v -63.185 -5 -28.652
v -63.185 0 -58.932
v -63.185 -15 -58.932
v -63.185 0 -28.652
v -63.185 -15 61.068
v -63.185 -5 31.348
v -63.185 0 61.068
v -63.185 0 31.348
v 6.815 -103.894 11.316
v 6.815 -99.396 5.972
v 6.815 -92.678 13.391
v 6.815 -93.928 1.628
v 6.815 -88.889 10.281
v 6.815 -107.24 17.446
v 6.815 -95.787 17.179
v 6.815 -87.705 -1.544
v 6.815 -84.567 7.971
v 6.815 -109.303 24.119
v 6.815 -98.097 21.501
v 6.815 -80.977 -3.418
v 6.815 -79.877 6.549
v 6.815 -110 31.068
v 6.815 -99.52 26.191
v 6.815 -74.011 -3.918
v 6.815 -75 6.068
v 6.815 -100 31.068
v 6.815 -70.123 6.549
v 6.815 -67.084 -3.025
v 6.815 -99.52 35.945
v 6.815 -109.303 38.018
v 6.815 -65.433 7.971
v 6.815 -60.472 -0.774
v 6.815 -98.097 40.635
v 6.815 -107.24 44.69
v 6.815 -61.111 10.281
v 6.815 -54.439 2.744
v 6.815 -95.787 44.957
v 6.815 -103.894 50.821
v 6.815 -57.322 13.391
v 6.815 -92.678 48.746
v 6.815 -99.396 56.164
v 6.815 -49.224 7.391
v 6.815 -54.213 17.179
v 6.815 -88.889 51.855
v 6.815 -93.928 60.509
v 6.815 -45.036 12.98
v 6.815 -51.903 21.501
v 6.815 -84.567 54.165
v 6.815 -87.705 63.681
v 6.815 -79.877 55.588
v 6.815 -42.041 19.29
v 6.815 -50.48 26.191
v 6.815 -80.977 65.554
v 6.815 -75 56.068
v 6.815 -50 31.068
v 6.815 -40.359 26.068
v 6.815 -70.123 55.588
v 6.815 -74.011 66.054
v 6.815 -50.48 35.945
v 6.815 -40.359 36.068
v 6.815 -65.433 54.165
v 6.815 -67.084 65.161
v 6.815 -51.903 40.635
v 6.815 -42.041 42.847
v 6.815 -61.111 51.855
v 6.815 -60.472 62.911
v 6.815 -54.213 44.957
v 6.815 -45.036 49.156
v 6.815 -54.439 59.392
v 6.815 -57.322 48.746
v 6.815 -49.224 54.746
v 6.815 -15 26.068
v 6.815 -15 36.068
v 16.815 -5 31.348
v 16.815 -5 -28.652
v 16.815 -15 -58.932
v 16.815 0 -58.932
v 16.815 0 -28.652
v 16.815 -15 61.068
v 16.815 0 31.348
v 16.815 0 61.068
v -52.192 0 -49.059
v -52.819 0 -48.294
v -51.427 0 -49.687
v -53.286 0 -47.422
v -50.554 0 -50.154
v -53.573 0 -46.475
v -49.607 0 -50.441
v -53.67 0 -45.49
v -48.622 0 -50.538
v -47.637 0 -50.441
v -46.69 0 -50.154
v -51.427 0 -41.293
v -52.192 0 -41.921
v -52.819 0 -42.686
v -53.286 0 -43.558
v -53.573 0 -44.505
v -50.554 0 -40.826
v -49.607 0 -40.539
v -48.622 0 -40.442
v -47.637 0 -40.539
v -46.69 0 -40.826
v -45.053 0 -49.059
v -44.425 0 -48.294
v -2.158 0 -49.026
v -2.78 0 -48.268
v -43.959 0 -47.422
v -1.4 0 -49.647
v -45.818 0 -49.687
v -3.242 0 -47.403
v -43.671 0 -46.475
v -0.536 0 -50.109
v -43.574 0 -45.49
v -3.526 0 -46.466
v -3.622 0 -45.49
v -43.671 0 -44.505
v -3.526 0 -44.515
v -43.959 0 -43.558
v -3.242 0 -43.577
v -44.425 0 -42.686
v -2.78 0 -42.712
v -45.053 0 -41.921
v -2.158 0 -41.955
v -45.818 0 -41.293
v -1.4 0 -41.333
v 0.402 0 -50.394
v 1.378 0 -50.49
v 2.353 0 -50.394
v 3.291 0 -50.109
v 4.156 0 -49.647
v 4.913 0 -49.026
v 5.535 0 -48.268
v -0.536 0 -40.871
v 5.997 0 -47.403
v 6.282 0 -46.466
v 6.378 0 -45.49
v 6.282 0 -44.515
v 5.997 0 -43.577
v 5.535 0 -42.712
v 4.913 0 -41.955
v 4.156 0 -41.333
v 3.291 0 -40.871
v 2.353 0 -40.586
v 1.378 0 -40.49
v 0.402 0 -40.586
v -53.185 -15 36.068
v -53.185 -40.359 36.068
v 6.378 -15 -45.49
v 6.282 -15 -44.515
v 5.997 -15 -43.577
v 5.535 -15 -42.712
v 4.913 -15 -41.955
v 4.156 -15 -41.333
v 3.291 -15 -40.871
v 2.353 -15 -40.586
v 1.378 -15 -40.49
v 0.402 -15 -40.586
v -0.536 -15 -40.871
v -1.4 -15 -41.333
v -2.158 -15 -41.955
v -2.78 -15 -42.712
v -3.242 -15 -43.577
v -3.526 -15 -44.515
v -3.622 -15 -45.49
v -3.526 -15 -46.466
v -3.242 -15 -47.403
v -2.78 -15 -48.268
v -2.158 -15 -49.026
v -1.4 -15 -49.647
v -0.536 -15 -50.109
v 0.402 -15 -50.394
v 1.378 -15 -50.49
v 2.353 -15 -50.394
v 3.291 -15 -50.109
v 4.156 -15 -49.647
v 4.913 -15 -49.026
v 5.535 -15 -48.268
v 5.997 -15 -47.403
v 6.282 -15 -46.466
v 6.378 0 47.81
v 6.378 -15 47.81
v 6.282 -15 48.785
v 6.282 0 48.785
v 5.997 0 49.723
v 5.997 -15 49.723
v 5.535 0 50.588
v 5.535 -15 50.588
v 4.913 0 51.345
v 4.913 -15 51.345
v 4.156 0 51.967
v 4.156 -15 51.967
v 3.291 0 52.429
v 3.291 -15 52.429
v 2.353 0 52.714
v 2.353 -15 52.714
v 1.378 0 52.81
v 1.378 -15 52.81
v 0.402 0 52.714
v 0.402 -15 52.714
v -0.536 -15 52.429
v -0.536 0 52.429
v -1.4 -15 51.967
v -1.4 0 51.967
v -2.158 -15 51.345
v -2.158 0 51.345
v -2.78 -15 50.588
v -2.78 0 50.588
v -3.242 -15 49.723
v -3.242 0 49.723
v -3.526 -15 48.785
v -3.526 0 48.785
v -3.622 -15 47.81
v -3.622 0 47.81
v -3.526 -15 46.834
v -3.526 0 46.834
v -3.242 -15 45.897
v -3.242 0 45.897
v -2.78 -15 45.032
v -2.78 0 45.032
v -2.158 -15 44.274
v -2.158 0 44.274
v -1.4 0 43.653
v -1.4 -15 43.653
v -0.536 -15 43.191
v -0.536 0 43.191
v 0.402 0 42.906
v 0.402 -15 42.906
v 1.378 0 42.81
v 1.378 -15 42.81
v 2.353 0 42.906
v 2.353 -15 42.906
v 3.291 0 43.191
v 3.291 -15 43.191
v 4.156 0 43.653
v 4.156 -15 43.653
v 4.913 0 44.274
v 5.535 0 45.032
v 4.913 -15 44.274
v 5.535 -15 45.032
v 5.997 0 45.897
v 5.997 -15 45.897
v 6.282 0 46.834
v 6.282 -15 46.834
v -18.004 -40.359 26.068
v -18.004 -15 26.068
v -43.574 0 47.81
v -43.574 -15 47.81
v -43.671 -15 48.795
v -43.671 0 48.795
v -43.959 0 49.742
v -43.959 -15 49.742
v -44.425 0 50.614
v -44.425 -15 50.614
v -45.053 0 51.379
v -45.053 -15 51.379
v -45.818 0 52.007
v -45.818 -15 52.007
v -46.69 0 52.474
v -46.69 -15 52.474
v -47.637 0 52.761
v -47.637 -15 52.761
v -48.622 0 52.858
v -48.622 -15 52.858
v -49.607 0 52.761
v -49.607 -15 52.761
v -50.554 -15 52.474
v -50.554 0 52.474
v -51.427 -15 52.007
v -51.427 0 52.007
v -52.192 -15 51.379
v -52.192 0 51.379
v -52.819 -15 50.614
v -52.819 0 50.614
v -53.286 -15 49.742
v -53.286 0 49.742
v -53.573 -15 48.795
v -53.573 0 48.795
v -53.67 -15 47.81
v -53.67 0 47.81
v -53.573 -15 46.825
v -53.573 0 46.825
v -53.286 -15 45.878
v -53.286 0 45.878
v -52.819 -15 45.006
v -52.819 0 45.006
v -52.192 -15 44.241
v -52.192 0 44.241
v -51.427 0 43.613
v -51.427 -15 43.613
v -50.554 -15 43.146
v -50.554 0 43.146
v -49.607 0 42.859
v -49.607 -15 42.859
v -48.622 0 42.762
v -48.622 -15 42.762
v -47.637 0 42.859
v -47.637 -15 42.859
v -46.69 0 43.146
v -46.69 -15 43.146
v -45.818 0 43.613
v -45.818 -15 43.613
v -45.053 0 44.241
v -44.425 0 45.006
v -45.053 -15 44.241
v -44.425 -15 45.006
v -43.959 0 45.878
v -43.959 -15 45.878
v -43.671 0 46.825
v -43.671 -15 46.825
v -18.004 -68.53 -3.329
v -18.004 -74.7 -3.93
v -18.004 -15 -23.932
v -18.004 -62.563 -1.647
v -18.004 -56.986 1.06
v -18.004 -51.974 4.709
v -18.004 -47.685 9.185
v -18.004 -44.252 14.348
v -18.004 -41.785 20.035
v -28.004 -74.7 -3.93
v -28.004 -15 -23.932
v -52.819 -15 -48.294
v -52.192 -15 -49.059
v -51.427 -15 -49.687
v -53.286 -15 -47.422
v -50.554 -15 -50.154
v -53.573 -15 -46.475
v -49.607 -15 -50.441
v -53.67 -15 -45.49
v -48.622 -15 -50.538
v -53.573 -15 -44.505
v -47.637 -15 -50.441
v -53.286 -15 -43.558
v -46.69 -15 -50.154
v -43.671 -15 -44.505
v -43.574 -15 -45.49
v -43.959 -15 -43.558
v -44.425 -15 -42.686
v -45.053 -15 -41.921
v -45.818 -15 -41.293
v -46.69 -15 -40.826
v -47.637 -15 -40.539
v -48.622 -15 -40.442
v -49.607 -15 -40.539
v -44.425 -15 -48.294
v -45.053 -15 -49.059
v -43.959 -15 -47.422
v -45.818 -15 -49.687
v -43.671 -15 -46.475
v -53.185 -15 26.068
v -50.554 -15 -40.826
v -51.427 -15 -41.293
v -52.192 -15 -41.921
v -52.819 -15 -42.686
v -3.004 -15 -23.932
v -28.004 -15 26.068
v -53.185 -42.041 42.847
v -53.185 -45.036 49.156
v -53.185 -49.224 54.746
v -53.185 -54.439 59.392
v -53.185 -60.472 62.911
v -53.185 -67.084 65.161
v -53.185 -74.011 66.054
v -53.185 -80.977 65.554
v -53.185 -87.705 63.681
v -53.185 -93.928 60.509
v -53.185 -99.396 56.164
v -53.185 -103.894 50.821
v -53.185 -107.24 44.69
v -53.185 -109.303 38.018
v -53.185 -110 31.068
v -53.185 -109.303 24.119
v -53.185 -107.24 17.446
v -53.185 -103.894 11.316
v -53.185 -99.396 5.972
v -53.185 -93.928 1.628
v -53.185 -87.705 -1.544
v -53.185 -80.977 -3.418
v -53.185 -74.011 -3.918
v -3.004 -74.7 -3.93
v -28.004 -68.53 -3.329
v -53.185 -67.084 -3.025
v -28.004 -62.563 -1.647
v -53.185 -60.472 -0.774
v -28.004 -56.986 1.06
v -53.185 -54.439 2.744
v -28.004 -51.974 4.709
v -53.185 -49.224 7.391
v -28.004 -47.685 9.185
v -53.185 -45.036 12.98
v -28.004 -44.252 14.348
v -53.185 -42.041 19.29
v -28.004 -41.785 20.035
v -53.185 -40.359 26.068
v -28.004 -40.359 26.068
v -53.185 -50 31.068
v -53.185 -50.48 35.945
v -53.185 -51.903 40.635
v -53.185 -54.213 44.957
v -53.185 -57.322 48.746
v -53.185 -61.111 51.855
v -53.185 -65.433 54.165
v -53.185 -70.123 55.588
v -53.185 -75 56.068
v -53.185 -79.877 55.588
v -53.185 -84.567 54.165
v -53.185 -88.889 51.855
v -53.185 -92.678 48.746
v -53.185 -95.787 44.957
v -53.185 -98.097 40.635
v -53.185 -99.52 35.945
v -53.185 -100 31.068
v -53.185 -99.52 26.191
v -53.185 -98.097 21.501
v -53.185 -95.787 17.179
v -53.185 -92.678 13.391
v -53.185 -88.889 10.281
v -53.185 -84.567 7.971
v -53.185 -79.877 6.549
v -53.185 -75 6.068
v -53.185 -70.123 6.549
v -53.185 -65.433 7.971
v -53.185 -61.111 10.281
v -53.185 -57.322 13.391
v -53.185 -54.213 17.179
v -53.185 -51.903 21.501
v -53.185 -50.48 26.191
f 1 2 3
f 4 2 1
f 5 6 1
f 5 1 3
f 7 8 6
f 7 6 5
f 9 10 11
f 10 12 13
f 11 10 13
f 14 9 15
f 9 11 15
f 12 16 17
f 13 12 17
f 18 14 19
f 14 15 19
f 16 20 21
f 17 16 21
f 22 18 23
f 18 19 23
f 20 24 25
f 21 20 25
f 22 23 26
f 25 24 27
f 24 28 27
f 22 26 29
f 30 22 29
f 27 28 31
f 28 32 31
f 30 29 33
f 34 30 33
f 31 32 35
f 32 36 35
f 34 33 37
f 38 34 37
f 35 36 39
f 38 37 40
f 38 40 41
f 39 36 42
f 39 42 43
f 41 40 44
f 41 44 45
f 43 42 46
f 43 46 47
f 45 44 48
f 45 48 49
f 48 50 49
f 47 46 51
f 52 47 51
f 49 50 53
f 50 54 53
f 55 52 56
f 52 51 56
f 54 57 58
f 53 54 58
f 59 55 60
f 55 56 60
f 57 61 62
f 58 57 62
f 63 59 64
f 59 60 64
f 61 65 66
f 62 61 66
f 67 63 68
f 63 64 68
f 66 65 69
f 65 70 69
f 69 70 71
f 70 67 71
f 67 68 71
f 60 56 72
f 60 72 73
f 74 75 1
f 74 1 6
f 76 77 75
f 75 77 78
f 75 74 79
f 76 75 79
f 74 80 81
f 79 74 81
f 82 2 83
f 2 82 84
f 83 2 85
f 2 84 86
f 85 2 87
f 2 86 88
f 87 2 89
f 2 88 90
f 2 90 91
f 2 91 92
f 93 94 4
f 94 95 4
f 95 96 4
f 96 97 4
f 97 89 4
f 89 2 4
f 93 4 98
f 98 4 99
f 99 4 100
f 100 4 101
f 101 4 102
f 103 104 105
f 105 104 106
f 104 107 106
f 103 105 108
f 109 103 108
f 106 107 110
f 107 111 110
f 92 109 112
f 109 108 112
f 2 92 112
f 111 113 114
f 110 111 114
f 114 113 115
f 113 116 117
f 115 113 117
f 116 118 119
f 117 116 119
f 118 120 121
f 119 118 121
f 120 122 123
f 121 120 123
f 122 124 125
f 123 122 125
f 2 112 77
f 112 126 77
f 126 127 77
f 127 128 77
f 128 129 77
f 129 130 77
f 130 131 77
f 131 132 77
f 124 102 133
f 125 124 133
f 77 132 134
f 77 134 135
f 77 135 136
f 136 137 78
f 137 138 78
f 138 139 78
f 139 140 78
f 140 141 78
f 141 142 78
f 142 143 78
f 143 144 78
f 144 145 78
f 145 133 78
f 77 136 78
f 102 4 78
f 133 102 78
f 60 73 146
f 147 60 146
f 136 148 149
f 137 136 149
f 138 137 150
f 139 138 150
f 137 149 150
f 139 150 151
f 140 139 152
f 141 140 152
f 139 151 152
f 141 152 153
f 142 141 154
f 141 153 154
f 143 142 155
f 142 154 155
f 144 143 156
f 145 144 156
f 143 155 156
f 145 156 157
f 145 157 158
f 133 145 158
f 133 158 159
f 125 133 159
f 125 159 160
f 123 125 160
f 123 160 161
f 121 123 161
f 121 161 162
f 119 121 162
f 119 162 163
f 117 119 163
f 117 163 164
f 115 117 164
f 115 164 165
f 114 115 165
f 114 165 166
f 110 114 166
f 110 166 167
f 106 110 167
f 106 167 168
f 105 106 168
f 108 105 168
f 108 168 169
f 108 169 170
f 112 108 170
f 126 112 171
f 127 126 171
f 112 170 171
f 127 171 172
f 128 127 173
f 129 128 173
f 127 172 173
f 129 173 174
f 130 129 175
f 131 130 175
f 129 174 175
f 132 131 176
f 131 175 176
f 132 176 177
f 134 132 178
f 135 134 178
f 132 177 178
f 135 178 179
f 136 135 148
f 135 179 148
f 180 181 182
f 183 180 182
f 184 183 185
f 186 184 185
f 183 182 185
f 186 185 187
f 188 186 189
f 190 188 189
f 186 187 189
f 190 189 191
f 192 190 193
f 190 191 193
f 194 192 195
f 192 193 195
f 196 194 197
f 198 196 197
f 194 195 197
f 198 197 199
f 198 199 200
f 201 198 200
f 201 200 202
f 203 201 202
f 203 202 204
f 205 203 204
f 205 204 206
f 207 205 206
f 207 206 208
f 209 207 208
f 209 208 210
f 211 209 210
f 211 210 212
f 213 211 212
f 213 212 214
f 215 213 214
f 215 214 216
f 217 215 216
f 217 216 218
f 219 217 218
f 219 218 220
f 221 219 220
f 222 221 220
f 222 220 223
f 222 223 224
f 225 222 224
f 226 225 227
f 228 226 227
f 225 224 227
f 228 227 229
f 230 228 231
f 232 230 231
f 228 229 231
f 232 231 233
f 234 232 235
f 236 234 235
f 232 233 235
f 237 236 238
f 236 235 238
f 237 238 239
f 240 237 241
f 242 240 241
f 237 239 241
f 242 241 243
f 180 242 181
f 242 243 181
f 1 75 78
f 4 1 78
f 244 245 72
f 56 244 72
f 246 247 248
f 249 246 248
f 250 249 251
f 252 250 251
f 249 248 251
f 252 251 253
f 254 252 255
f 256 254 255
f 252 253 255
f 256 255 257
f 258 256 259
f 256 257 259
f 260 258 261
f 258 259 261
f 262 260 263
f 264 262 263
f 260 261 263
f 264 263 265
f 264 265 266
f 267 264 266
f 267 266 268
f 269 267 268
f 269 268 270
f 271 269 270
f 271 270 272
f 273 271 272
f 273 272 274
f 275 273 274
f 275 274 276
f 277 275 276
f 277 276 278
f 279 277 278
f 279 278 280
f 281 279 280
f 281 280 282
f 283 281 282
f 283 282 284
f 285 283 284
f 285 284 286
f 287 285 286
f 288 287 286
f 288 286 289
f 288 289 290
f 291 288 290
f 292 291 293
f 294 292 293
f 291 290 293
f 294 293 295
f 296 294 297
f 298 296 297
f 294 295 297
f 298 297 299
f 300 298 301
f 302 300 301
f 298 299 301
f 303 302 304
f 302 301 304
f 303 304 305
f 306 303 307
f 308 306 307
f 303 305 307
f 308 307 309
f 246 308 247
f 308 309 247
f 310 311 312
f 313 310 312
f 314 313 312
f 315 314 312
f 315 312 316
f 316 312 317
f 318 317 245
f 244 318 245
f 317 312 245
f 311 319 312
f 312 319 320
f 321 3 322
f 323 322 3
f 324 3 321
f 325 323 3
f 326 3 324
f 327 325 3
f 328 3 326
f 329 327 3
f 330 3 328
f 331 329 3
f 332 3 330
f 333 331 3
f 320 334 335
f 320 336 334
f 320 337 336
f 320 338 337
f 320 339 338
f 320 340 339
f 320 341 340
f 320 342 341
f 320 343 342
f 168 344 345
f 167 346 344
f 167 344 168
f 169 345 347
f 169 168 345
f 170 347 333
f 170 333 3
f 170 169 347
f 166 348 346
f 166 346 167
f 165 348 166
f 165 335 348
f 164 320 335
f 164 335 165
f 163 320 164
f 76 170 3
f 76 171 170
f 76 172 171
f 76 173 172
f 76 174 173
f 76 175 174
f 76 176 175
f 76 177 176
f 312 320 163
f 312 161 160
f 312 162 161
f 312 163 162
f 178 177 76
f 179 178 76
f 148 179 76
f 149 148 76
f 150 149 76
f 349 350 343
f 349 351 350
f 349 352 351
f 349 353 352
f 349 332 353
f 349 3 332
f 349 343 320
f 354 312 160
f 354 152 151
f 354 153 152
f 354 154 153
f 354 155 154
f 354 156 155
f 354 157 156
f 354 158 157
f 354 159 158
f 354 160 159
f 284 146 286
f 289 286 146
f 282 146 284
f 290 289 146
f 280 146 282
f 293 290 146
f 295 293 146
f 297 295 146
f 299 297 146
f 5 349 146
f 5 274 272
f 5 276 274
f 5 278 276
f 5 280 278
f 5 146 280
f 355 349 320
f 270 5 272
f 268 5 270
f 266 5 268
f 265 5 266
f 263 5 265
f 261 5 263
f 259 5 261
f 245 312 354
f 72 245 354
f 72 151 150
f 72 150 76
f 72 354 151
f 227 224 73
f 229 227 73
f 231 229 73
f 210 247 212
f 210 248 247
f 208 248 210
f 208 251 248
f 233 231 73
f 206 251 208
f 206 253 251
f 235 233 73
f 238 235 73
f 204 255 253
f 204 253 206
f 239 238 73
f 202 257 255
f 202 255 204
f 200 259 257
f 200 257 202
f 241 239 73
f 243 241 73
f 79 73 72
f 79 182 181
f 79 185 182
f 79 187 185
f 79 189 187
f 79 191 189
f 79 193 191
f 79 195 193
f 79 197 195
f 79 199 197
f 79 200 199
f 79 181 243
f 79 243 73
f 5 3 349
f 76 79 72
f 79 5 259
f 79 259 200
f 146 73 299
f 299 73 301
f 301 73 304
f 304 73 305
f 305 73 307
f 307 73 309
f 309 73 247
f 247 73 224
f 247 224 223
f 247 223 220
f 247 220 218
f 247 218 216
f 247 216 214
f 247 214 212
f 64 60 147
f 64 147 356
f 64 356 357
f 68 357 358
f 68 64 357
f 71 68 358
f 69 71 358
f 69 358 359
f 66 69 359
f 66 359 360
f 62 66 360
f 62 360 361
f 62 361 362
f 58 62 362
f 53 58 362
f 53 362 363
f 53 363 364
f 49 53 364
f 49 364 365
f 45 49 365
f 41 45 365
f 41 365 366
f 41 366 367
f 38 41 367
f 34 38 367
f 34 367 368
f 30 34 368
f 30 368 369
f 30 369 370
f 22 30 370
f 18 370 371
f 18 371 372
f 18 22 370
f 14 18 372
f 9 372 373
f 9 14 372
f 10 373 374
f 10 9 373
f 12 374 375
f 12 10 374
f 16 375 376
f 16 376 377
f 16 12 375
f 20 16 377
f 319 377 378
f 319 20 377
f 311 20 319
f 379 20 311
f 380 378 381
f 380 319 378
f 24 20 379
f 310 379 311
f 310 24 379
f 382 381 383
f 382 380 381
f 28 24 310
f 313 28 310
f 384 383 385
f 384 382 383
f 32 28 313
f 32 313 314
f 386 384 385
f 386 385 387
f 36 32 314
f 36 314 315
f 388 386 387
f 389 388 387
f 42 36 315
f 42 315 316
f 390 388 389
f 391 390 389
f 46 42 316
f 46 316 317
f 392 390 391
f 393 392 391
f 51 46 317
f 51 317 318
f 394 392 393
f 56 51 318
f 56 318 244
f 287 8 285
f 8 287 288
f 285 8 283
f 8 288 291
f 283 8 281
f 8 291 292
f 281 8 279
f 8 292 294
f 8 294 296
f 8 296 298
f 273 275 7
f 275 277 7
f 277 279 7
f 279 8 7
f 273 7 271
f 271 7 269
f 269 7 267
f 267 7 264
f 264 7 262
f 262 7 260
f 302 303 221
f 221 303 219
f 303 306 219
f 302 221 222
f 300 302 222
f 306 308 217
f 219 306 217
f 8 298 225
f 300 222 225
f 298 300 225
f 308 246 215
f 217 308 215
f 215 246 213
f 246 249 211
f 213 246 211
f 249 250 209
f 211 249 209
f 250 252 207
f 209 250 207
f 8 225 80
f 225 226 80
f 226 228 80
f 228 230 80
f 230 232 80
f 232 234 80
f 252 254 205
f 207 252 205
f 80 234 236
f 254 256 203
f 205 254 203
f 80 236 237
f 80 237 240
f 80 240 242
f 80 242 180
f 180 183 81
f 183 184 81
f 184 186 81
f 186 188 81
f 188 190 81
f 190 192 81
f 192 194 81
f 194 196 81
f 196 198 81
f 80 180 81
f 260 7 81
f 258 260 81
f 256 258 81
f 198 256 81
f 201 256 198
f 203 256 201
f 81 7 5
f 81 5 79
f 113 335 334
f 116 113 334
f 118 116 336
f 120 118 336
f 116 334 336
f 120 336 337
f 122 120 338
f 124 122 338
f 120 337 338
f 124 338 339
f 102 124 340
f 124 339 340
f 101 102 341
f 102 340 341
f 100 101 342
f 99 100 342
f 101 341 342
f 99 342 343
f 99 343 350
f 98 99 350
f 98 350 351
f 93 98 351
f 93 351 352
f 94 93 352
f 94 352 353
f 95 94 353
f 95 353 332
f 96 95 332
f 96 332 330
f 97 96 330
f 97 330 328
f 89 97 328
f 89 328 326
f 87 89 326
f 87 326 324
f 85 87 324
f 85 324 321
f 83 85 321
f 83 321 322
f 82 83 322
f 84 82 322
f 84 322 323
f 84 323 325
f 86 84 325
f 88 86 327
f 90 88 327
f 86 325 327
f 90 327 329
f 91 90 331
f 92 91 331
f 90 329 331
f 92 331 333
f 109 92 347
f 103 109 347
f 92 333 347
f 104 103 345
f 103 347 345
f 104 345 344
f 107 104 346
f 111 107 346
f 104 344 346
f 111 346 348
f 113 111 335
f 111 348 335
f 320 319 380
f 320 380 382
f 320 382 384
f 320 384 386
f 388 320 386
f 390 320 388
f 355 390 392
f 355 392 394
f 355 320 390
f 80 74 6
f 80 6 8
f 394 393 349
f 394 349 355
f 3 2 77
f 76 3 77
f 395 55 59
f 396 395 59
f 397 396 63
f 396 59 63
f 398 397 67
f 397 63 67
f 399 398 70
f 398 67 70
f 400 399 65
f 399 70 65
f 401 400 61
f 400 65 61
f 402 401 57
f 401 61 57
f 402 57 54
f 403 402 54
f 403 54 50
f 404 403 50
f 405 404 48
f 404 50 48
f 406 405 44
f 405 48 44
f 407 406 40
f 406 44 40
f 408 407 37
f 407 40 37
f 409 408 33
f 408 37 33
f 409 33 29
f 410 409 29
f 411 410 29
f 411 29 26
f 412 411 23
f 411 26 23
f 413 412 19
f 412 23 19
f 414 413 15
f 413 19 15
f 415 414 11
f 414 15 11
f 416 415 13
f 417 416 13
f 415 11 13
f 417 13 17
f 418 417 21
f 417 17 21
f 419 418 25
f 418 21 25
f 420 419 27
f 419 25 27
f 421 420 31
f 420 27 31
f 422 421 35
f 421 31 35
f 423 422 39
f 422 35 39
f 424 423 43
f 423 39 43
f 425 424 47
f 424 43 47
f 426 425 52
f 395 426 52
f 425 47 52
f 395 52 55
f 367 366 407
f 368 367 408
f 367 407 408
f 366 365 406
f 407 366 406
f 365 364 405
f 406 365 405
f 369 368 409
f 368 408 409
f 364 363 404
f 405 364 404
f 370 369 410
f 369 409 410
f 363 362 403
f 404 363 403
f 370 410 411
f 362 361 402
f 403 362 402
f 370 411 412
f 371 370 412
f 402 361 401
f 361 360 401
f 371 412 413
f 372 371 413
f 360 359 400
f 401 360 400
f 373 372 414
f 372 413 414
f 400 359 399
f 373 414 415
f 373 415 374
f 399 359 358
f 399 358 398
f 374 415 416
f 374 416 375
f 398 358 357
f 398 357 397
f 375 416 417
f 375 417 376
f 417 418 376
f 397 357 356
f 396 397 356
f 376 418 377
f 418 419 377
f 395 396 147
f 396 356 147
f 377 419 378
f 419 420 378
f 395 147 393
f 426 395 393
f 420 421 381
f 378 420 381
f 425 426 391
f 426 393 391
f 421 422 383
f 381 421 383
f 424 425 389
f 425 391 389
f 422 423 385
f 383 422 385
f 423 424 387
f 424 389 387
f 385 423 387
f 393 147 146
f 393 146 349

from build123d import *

# Parameters (mm, degrees)
F0_W      = 80
F0_H      = 120
F1_DEPTH  = 15
F3_DEPTH  = 60
F4_R      = 35
F4_R_2    = 25
F5_DEPTH  = 60
F6_R      = 25
F7_DEPTH  = 72.2
F8_W      = 10
F8_H      = 50
F9_DEPTH  = 59.7
F11_DEPTH = 25
F12_R     = 5.047849
F12_R_2   = 5
F13_DEPTH = 39.5
F14_W     = 5
F14_H     = 60
F15_DEPTH = 85.5
F16_R     = 25
F17_DEPTH = 91.3


with BuildPart() as f1:
    # F0 (on Front) → F1 (new body)
    with BuildSketch(Plane.XZ):
        with Locations((-23.184717, 1.068225)):
            Rectangle(F0_W, F0_H)
    extrude(amount=F1_DEPTH)

    # F2 (on face) → F3 (join)
    with BuildSketch(Plane.XZ.offset(15)):
        Polygon((6.815283, 36.068225), (-53.184717, 36.068225), (-53.184717, 26.068225), (-27.741479, 26.068225), (-17.741479, 26.068225), (6.815283, 26.068225), align=None)
    extrude(amount=F3_DEPTH)

    # F4 (on face) → F5 (join)
    with BuildSketch(Plane.YZ.offset(6.815283)):
        with Locations((-75, 31.068225)):
            Circle(F4_R)
        with Locations((-75, 31.068225)):
            Circle(F4_R_2, mode=Mode.SUBTRACT)
    extrude(amount=-F5_DEPTH)

    # F6 (on face) → F7 (cut)
    with BuildSketch(Plane.YZ.offset(6.815283)):
        with Locations((-75, 31.068225)):
            Circle(F6_R)
    extrude(amount=-F7_DEPTH, mode=Mode.SUBTRACT)

    # F8 (on face) → F9 (join)
    with BuildSketch(Plane.XZ.offset(15)):
        with Locations((-23.003544, 1.068225)):
            Rectangle(F8_W, F8_H)
    extrude(amount=F9_DEPTH)

    # F10 (on face) → F11 (cut)
    with BuildSketch(Plane(origin=(-28.003544, 0, 0), x_dir=(0, -1, 0), z_dir=(-1, 0, 0))):
        Polygon((87.144889, -23.931775), (74.7, -3.930489), (15, -23.931775), (56.138653, -39.033107), align=None)
    extrude(amount=-F11_DEPTH, mode=Mode.SUBTRACT)

    # F12 (on face) → F13 (cut)
    with BuildSketch(Plane.XZ.offset(15)):
        with Locations((-48.622161, -45.490056)):
            Circle(F12_R)
        with Locations((1.377839, -45.490056)):
            Circle(F12_R_2)
        with Locations((-48.622161, 47.809944)):
            Circle(F12_R)
        with Locations((1.377839, 47.809944)):
            Circle(F12_R_2)
    extrude(amount=-F13_DEPTH, mode=Mode.SUBTRACT)

    # F14 (on face) → F15 (cut)
    with BuildSketch(Plane.YZ.offset(16.815283)):
        with Locations((-2.5, 1.347677)):
            Rectangle(F14_W, F14_H)
    extrude(amount=-F15_DEPTH, mode=Mode.SUBTRACT)

    # F16 (on face) → F17 (cut)
    with BuildSketch(Plane(origin=(-53.184717, 0, 0), x_dir=(0, -1, 0), z_dir=(-1, 0, 0))):
        with Locations((75, 31.068225)):
            Circle(F16_R)
    extrude(amount=-F17_DEPTH, mode=Mode.SUBTRACT)


solid = f1.part
